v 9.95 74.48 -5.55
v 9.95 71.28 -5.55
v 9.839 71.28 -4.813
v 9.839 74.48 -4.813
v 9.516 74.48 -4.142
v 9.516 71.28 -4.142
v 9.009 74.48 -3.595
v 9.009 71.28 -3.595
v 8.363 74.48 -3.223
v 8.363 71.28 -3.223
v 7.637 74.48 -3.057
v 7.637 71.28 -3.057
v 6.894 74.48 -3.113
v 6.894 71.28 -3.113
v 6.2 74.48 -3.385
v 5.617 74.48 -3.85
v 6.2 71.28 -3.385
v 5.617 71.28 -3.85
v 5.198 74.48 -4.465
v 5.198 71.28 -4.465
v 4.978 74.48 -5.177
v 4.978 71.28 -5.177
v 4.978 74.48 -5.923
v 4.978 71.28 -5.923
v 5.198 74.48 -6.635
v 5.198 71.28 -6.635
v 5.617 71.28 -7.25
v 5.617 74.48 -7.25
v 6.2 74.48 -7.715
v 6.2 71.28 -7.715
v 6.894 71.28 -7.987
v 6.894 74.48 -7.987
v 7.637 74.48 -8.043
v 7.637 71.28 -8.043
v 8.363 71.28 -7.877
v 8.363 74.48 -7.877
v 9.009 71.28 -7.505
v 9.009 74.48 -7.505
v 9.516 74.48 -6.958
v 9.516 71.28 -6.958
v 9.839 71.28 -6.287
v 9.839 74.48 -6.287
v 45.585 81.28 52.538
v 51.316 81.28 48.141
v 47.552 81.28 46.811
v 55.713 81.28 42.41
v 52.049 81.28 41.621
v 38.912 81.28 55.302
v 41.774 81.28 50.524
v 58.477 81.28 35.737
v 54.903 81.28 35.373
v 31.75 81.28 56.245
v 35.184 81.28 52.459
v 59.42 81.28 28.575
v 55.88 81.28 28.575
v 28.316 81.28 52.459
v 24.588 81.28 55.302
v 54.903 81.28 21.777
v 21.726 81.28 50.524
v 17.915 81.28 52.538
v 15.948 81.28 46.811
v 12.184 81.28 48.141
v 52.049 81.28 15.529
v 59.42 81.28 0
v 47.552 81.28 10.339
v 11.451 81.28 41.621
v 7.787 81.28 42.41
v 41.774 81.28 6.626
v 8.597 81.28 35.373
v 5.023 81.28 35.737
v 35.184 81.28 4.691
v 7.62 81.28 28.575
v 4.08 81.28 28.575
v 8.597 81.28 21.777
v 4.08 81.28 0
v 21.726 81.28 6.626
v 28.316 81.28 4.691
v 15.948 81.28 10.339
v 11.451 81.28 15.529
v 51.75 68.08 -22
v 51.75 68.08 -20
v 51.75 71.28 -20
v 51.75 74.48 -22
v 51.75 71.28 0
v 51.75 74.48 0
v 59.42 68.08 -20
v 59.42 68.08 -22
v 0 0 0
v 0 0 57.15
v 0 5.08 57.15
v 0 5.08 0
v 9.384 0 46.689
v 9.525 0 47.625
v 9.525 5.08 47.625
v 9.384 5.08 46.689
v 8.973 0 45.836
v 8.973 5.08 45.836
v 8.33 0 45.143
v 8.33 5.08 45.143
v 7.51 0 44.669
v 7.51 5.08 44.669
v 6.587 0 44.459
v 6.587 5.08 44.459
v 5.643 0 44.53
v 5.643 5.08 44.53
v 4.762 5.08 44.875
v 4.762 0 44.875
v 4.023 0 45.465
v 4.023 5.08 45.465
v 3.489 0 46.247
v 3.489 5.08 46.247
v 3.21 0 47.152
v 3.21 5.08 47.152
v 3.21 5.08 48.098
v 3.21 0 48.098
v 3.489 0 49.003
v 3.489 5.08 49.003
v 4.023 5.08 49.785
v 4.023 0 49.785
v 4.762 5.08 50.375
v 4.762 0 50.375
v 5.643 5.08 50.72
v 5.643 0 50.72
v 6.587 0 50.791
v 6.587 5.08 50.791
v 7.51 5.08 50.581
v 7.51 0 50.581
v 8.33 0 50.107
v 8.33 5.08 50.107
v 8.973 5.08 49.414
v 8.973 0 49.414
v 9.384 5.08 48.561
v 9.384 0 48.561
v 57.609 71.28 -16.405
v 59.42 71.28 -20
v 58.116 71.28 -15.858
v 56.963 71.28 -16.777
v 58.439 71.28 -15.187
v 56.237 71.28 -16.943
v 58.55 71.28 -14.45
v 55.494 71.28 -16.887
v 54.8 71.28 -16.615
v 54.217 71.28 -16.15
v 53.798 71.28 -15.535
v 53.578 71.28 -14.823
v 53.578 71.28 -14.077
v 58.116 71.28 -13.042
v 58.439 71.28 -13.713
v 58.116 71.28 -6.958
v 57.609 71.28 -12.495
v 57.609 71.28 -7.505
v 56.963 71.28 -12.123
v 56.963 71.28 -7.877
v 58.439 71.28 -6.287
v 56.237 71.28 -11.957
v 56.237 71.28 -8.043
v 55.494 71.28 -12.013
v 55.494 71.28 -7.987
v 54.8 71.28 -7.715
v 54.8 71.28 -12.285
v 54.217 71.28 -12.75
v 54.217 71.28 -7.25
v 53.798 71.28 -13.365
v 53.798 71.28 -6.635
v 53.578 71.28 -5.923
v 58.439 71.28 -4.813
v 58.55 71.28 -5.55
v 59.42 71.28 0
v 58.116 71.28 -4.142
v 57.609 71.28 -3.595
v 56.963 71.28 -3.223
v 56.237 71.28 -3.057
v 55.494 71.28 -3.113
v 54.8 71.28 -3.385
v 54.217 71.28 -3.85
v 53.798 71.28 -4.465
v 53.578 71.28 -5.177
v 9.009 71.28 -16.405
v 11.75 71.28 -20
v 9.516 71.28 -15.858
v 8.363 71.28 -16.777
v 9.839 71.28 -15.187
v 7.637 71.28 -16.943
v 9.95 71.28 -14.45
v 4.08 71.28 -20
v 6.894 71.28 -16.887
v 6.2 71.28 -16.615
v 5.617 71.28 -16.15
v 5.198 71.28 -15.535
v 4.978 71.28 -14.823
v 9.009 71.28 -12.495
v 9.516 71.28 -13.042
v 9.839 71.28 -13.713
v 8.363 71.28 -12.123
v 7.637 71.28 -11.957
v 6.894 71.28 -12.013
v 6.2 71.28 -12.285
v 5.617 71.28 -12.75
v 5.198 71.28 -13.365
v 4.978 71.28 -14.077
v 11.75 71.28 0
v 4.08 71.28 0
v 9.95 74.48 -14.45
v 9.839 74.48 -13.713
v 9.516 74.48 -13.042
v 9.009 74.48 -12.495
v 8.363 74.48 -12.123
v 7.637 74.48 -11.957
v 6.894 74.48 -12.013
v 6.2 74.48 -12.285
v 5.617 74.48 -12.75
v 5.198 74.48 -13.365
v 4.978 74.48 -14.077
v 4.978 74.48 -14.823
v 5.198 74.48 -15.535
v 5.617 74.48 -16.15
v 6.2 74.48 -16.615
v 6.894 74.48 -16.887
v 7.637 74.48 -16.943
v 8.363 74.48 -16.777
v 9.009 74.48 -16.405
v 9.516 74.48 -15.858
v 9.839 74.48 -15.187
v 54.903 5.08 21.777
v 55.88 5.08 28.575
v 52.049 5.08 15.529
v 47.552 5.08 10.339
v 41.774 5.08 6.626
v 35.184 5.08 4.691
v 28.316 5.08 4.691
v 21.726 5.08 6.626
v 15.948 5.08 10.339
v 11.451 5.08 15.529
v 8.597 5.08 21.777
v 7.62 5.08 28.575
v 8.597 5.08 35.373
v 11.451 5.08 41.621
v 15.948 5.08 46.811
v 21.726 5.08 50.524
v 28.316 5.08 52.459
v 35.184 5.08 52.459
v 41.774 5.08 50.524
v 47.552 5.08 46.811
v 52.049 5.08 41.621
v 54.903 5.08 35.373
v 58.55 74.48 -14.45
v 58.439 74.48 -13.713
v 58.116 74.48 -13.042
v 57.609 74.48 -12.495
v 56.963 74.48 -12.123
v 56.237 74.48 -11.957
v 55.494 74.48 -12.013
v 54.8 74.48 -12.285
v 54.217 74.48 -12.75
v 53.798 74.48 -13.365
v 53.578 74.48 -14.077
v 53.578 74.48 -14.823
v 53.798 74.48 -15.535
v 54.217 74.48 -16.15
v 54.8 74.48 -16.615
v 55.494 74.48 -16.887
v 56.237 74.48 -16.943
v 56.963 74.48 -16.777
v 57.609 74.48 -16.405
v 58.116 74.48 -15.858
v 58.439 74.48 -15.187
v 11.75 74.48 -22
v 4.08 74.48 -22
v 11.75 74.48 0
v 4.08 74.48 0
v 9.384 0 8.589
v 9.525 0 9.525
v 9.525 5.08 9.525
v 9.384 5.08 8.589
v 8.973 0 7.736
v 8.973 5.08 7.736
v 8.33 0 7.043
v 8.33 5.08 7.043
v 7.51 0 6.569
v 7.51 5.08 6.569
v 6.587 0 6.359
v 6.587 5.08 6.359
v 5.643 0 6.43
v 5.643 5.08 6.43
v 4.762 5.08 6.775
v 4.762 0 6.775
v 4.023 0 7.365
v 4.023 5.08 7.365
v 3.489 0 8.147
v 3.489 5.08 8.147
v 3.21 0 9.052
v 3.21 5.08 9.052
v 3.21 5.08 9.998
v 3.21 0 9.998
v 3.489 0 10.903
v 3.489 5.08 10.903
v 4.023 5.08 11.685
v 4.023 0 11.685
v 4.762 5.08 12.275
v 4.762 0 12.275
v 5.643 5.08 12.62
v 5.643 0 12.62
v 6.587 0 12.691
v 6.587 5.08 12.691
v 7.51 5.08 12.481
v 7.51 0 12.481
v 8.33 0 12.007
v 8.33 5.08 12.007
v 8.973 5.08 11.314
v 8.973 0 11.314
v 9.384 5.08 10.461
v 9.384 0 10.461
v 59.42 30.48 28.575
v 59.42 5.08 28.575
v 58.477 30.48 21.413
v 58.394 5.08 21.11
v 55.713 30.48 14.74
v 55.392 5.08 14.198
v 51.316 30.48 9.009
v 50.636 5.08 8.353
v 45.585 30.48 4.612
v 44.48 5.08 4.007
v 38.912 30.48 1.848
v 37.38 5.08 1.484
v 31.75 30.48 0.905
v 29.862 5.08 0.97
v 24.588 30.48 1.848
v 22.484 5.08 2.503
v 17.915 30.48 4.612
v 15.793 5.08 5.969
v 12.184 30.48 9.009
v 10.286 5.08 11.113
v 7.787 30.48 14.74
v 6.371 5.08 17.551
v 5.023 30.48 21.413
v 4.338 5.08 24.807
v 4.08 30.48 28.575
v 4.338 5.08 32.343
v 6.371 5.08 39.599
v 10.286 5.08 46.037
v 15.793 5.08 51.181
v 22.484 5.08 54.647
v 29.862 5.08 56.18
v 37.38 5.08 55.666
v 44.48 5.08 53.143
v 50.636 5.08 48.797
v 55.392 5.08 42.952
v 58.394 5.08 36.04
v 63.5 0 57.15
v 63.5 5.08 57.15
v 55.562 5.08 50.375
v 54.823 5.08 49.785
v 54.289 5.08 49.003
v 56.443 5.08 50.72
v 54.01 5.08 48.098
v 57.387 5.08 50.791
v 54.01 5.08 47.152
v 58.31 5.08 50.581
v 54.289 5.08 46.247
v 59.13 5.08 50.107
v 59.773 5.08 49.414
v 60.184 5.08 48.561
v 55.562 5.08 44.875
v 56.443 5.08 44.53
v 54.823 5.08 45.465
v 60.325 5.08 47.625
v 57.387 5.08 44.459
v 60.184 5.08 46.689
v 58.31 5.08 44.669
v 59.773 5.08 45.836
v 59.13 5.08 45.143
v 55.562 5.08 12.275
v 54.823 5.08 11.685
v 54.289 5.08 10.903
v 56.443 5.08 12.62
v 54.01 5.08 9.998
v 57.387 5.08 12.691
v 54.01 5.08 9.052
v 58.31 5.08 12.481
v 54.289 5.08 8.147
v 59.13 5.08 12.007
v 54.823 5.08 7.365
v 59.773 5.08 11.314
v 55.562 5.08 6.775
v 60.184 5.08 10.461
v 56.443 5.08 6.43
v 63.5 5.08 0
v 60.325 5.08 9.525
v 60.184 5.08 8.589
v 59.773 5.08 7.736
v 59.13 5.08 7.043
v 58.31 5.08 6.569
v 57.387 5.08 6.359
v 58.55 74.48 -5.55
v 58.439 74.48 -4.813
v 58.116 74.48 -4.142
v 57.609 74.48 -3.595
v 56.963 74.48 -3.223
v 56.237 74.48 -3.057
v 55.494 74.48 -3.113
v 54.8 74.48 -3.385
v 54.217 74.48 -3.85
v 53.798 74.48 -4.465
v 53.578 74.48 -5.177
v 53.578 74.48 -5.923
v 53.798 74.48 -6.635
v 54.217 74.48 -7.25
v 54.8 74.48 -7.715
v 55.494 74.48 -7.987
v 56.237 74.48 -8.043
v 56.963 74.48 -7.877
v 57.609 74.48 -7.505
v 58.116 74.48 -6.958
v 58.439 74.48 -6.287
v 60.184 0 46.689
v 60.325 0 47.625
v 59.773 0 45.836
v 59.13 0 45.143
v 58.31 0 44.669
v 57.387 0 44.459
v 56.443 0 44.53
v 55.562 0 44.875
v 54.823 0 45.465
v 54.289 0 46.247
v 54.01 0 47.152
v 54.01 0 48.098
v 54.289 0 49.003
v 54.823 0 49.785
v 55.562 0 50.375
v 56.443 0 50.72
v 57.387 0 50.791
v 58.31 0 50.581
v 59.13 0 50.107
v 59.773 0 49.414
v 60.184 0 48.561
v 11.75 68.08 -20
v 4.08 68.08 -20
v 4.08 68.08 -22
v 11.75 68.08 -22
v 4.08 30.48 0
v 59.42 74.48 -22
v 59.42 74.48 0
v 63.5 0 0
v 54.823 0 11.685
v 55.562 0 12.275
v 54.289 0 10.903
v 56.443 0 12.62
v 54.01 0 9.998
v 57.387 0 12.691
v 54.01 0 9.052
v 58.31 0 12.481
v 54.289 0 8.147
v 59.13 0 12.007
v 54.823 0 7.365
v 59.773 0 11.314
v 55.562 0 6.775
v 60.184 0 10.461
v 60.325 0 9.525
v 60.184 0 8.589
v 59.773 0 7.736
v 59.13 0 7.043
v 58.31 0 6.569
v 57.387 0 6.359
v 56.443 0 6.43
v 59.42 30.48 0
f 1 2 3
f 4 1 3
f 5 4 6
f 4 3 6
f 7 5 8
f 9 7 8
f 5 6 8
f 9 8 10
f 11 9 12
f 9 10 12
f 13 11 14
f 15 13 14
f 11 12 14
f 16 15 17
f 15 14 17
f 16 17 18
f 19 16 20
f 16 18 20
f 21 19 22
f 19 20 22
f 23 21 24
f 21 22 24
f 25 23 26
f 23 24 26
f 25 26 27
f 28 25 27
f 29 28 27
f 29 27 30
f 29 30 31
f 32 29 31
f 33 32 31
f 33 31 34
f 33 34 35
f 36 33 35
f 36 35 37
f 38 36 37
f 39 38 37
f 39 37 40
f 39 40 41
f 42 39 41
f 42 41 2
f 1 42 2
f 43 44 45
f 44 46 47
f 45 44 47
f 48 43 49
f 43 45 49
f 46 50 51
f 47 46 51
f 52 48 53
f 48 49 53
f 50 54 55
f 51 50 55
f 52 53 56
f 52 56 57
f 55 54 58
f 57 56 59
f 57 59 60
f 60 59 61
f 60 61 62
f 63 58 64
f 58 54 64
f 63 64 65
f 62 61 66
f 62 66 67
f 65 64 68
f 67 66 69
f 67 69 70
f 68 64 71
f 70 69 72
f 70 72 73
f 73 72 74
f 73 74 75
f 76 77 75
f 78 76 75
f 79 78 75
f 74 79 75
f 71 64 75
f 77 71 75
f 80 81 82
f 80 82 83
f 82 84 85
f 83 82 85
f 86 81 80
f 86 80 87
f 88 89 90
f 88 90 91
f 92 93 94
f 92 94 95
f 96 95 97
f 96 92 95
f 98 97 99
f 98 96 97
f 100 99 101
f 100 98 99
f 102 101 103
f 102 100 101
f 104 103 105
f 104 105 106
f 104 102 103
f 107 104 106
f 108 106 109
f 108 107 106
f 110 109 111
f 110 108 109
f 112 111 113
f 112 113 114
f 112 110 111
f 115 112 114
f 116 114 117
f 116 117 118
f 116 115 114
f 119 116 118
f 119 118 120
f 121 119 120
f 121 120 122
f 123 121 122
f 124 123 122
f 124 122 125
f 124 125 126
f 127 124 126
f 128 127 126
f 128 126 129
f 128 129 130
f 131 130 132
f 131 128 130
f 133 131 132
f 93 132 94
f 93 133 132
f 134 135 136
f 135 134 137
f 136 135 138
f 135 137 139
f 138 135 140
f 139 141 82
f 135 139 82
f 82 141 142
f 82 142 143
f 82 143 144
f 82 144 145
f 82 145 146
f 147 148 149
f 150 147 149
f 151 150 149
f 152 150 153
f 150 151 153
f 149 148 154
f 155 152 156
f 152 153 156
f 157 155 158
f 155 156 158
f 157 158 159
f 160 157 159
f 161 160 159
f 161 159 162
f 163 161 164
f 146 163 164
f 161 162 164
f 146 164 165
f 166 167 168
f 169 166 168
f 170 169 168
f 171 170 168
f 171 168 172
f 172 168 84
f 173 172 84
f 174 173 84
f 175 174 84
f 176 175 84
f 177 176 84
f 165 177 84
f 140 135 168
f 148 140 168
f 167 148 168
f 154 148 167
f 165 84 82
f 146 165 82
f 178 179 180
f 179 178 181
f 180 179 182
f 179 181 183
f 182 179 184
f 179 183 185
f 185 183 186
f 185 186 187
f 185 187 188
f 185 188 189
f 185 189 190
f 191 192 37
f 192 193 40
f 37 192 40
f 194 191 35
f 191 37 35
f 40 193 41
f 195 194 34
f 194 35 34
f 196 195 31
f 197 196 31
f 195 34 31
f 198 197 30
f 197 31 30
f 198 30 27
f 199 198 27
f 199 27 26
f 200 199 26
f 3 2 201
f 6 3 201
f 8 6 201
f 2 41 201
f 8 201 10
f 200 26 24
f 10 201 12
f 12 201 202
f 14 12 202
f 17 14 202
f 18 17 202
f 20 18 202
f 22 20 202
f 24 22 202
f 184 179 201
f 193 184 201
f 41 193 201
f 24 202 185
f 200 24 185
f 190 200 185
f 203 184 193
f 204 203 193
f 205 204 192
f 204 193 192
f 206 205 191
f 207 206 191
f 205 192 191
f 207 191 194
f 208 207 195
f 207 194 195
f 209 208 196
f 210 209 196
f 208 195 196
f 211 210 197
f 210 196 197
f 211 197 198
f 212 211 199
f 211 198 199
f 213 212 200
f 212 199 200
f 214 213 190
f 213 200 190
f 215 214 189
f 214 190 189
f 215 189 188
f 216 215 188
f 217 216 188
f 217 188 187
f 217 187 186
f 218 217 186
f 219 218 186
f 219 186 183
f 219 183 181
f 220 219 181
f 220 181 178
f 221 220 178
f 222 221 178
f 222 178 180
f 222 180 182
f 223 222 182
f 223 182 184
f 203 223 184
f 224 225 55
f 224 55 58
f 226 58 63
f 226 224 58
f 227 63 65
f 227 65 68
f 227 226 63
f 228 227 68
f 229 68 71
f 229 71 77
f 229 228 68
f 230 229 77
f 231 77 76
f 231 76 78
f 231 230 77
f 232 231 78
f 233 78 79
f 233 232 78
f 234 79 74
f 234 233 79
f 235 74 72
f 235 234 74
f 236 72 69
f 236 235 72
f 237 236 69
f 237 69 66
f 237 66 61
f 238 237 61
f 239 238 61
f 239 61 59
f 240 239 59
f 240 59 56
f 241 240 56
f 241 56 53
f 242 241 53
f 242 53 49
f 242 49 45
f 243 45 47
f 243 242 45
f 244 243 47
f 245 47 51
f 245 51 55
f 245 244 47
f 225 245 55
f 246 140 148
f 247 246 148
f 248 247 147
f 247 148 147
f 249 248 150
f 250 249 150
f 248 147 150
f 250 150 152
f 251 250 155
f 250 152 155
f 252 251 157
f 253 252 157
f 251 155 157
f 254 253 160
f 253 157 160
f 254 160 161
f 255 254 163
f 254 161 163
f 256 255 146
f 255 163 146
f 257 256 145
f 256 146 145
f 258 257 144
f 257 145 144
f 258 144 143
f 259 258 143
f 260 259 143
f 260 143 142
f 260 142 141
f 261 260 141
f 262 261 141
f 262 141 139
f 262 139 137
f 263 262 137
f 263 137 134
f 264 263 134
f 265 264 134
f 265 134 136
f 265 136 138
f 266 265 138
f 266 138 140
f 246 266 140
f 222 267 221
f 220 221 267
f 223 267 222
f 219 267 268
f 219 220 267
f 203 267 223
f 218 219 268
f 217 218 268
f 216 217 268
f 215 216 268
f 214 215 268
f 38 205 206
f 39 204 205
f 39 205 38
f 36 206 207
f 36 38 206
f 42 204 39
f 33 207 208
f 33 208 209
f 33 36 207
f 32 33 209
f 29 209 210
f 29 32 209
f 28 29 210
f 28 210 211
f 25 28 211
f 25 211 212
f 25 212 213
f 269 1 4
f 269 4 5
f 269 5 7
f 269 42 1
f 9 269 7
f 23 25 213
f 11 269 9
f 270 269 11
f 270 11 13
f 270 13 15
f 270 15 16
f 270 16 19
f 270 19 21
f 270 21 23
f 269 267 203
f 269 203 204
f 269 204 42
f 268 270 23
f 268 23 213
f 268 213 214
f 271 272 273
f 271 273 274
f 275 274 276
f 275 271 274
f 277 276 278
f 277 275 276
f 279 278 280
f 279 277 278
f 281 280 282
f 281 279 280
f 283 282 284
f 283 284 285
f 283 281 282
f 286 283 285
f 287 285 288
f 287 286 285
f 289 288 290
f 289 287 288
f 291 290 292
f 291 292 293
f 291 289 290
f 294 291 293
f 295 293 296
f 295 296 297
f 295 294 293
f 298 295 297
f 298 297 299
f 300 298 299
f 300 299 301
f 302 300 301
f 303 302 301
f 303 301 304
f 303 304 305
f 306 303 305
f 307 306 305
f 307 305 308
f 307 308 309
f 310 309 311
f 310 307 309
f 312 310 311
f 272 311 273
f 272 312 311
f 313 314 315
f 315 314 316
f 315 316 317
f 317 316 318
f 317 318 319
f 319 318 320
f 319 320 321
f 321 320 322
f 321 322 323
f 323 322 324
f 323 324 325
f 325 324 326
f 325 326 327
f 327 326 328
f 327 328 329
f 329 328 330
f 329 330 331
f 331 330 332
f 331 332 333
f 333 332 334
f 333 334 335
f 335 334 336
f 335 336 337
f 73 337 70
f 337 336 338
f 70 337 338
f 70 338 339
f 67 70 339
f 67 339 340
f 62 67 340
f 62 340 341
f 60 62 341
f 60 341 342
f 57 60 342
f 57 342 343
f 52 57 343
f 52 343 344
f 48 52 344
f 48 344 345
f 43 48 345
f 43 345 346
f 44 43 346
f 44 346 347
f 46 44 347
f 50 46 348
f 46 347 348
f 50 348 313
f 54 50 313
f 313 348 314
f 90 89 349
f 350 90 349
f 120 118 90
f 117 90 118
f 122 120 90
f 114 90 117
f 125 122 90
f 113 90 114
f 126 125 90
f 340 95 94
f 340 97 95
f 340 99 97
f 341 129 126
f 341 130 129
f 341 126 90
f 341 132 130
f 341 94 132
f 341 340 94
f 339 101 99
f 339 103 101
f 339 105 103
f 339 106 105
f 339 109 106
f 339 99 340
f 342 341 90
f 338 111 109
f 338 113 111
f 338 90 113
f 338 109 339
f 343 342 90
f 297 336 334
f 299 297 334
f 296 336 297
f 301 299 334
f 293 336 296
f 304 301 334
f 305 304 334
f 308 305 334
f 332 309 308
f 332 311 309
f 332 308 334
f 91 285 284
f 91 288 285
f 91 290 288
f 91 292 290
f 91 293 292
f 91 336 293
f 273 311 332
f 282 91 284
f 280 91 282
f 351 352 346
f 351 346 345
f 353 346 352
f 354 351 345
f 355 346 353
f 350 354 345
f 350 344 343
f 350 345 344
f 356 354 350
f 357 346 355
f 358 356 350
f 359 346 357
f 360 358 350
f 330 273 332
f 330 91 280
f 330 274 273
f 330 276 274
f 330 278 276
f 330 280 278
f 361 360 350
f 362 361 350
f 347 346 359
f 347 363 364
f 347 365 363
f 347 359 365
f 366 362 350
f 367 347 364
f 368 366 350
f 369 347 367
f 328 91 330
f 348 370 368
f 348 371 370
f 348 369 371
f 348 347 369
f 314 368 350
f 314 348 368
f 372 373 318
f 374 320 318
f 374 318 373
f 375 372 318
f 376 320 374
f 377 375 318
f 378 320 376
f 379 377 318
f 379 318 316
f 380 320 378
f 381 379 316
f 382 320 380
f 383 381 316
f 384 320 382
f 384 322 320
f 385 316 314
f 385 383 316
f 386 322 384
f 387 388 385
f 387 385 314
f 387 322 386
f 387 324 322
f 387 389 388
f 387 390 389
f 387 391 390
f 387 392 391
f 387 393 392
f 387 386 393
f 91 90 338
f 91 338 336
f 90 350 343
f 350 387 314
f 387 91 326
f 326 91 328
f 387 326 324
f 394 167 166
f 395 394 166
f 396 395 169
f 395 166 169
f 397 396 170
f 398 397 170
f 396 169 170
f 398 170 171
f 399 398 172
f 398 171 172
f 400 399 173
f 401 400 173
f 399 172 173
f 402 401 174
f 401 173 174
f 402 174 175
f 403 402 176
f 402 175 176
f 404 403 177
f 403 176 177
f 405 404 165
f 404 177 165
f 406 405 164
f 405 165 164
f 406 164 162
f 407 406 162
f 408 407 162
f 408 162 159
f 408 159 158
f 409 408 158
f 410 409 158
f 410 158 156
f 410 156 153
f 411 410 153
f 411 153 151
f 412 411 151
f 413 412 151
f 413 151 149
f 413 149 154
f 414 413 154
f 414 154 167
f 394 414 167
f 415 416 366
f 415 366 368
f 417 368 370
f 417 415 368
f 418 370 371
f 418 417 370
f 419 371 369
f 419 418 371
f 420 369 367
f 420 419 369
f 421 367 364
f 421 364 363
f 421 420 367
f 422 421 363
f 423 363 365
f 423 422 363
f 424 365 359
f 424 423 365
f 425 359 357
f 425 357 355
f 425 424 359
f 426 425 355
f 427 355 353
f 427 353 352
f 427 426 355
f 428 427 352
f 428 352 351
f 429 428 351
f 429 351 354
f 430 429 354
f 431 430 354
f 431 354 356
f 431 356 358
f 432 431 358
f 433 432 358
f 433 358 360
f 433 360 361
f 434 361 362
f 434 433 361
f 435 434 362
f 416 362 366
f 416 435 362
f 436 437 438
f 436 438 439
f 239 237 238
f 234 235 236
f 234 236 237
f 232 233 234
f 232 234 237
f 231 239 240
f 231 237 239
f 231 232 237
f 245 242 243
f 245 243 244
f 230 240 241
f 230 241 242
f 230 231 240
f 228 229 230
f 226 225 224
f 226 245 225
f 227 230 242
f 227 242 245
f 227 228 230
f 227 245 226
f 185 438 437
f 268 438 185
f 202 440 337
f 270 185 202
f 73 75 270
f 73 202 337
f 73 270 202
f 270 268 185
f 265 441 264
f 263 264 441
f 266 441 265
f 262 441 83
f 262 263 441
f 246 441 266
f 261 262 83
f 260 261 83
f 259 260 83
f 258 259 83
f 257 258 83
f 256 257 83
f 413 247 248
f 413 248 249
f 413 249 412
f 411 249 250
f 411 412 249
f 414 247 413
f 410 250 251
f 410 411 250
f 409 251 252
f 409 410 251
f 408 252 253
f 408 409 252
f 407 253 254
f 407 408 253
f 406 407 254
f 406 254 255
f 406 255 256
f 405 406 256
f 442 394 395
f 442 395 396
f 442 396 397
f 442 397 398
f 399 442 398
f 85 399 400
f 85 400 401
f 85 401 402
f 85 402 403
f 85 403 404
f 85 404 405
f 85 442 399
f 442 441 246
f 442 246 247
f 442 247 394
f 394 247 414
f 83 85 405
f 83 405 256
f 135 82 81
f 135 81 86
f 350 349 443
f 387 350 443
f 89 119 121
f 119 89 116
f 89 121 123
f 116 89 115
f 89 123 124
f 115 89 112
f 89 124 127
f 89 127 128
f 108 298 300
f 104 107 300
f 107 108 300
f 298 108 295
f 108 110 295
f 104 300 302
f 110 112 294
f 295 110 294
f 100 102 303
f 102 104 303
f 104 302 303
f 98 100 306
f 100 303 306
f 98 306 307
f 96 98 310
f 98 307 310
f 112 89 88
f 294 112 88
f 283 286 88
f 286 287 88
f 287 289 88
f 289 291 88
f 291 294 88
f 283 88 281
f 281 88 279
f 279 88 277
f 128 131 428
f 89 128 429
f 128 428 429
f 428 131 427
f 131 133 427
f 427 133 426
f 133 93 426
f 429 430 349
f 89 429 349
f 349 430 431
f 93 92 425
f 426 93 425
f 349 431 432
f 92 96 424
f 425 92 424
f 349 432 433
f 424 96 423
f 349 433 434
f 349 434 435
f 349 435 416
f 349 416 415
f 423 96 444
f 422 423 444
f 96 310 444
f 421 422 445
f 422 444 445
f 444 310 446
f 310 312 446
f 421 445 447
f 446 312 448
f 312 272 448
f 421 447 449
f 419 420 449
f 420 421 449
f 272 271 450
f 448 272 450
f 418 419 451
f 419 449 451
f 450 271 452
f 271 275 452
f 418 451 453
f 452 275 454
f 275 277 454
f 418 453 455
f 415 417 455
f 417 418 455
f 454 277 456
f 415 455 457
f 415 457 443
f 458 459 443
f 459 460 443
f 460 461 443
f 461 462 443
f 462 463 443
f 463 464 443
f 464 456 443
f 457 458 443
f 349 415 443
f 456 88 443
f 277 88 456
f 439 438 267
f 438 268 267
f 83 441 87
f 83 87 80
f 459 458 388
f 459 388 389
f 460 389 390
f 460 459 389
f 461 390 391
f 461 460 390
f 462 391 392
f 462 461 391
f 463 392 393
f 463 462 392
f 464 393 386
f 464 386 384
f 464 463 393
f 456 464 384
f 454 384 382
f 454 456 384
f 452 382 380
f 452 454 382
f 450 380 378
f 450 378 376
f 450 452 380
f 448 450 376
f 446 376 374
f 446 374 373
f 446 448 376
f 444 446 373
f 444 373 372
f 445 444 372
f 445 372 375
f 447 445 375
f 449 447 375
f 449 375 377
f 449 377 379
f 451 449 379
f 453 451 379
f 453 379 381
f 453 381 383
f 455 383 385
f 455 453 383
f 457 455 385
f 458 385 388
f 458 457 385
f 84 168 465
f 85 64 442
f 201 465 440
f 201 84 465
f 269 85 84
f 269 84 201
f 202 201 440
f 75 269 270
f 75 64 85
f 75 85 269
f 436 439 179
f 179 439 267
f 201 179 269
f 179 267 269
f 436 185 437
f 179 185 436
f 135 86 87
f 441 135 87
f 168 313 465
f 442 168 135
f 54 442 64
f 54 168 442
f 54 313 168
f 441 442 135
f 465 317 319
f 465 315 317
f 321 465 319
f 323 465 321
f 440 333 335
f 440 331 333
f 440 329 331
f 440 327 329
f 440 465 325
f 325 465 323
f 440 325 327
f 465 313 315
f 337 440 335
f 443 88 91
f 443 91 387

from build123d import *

# Parameters (mm, degrees)
SKETCH1_W           = 63.5
SKETCH1_H           = 57.15
SKETCH1_R           = 3.175
BOSS_EXTRUDE1_DEPTH = 5.08
SKETCH2_R           = 27.67
SKETCH2_R_2         = 24.13
BOSS_EXTRUDE2_DEPTH = 76.2
BOSS_EXTRUDE3_REACH = 59.15
SKETCH4_W           = 55.34
SKETCH4_H           = 50.8
SKETCH5_W           = 7.67
SKETCH5_H           = 3.2
BOSS_EXTRUDE4_DEPTH = 20
SKETCH6_R           = 2.5
CUT_EXTRUDE1_DEPTH  = 11
SKETCH7_W           = 7.67
SKETCH7_H           = 3.2
BOSS_EXTRUDE5_DEPTH = 2
SKETCH8_W           = 7.67
SKETCH8_H           = 2
BOSS_EXTRUDE6_DEPTH = 3.2


with BuildPart() as part:
    # Sketch1 → Boss-Extrude1 (new body)
    with BuildSketch(Plane(origin=(0, 0, 0), x_dir=(1, 0, 0), z_dir=(0, 1, 0))):
        with Locations((31.75, -28.575)):
            Rectangle(SKETCH1_W, SKETCH1_H)
        with Locations((6.35, -9.525)):
            Circle(SKETCH1_R, mode=Mode.SUBTRACT)
        with Locations((57.15, -9.525)):
            Circle(SKETCH1_R, mode=Mode.SUBTRACT)
        with Locations((57.15, -47.625)):
            Circle(SKETCH1_R, mode=Mode.SUBTRACT)
        with Locations((6.35, -47.625)):
            Circle(SKETCH1_R, mode=Mode.SUBTRACT)
    extrude(amount=BOSS_EXTRUDE1_DEPTH)

    # Sketch2 → Boss-Extrude2 (add)
    with BuildSketch(Plane(origin=(0, 5.08, 0), x_dir=(1, 0, 0), z_dir=(0, 1, 0))):
        with Locations((31.75, -28.575)):
            Circle(SKETCH2_R)
        with Locations((31.75, -28.575)):
            Circle(SKETCH2_R_2, mode=Mode.SUBTRACT)
    extrude(amount=BOSS_EXTRUDE2_DEPTH)

    # Sketch4 → Boss-Extrude3 (add, up to next)
    with BuildSketch(Plane(origin=(0, 0, 0), x_dir=(-1, 0, 0), z_dir=(0, 0, -1)), mode=Mode.PRIVATE) as boss_extrude3_sk1:
        with Locations((-31.75, 55.88)):
            Rectangle(SKETCH4_W, SKETCH4_H)
    boss_extrude3_tool1 = extrude(boss_extrude3_sk1.sketch, amount=-BOSS_EXTRUDE3_REACH, mode=Mode.PRIVATE) - part.part
    add(boss_extrude3_tool1.solids().sort_by_distance((31.75, 55.88, 0))[0])

    # Sketch5 → Boss-Extrude4 (add)
    with BuildSketch(Plane(origin=(0, 0, 0), x_dir=(-1, 0, 0), z_dir=(0, 0, -1))):
        with Locations((-7.915, 72.88)):
            Rectangle(SKETCH5_W, SKETCH5_H)
        with Locations((-55.585, 72.88)):
            Rectangle(SKETCH5_W, SKETCH5_H)
    extrude(amount=BOSS_EXTRUDE4_DEPTH)

    # Sketch6 → Cut-Extrude1 (cut, through all)
    with BuildSketch(Plane.XZ.offset(-71.28)):
        with Locations((7.45, -5.55)):
            Circle(SKETCH6_R)
        with Locations((56.05, -5.55)):
            Circle(SKETCH6_R)
        with Locations((56.05, -14.45)):
            Circle(SKETCH6_R)
        with Locations((7.45, -14.45)):
            Circle(SKETCH6_R)
    extrude(amount=-CUT_EXTRUDE1_DEPTH, mode=Mode.SUBTRACT)

    # Sketch7 → Boss-Extrude5 (add)
    with BuildSketch(Plane(origin=(0, 0, -20), x_dir=(-1, 0, 0), z_dir=(0, 0, -1))):
        with Locations((-55.585, 72.88)):
            Rectangle(SKETCH7_W, SKETCH7_H)
        with Locations((-7.915, 72.88)):
            Rectangle(SKETCH7_W, SKETCH7_H)
    extrude(amount=BOSS_EXTRUDE5_DEPTH)

    # Sketch8 → Boss-Extrude6 (add)
    with BuildSketch(Plane.XZ.offset(-71.28)):
        with Locations((7.915, -21)):
            Rectangle(SKETCH8_W, SKETCH8_H)
        with Locations((55.585, -21)):
            Rectangle(SKETCH8_W, SKETCH8_H)
    extrude(amount=BOSS_EXTRUDE6_DEPTH)


solid = part.part
